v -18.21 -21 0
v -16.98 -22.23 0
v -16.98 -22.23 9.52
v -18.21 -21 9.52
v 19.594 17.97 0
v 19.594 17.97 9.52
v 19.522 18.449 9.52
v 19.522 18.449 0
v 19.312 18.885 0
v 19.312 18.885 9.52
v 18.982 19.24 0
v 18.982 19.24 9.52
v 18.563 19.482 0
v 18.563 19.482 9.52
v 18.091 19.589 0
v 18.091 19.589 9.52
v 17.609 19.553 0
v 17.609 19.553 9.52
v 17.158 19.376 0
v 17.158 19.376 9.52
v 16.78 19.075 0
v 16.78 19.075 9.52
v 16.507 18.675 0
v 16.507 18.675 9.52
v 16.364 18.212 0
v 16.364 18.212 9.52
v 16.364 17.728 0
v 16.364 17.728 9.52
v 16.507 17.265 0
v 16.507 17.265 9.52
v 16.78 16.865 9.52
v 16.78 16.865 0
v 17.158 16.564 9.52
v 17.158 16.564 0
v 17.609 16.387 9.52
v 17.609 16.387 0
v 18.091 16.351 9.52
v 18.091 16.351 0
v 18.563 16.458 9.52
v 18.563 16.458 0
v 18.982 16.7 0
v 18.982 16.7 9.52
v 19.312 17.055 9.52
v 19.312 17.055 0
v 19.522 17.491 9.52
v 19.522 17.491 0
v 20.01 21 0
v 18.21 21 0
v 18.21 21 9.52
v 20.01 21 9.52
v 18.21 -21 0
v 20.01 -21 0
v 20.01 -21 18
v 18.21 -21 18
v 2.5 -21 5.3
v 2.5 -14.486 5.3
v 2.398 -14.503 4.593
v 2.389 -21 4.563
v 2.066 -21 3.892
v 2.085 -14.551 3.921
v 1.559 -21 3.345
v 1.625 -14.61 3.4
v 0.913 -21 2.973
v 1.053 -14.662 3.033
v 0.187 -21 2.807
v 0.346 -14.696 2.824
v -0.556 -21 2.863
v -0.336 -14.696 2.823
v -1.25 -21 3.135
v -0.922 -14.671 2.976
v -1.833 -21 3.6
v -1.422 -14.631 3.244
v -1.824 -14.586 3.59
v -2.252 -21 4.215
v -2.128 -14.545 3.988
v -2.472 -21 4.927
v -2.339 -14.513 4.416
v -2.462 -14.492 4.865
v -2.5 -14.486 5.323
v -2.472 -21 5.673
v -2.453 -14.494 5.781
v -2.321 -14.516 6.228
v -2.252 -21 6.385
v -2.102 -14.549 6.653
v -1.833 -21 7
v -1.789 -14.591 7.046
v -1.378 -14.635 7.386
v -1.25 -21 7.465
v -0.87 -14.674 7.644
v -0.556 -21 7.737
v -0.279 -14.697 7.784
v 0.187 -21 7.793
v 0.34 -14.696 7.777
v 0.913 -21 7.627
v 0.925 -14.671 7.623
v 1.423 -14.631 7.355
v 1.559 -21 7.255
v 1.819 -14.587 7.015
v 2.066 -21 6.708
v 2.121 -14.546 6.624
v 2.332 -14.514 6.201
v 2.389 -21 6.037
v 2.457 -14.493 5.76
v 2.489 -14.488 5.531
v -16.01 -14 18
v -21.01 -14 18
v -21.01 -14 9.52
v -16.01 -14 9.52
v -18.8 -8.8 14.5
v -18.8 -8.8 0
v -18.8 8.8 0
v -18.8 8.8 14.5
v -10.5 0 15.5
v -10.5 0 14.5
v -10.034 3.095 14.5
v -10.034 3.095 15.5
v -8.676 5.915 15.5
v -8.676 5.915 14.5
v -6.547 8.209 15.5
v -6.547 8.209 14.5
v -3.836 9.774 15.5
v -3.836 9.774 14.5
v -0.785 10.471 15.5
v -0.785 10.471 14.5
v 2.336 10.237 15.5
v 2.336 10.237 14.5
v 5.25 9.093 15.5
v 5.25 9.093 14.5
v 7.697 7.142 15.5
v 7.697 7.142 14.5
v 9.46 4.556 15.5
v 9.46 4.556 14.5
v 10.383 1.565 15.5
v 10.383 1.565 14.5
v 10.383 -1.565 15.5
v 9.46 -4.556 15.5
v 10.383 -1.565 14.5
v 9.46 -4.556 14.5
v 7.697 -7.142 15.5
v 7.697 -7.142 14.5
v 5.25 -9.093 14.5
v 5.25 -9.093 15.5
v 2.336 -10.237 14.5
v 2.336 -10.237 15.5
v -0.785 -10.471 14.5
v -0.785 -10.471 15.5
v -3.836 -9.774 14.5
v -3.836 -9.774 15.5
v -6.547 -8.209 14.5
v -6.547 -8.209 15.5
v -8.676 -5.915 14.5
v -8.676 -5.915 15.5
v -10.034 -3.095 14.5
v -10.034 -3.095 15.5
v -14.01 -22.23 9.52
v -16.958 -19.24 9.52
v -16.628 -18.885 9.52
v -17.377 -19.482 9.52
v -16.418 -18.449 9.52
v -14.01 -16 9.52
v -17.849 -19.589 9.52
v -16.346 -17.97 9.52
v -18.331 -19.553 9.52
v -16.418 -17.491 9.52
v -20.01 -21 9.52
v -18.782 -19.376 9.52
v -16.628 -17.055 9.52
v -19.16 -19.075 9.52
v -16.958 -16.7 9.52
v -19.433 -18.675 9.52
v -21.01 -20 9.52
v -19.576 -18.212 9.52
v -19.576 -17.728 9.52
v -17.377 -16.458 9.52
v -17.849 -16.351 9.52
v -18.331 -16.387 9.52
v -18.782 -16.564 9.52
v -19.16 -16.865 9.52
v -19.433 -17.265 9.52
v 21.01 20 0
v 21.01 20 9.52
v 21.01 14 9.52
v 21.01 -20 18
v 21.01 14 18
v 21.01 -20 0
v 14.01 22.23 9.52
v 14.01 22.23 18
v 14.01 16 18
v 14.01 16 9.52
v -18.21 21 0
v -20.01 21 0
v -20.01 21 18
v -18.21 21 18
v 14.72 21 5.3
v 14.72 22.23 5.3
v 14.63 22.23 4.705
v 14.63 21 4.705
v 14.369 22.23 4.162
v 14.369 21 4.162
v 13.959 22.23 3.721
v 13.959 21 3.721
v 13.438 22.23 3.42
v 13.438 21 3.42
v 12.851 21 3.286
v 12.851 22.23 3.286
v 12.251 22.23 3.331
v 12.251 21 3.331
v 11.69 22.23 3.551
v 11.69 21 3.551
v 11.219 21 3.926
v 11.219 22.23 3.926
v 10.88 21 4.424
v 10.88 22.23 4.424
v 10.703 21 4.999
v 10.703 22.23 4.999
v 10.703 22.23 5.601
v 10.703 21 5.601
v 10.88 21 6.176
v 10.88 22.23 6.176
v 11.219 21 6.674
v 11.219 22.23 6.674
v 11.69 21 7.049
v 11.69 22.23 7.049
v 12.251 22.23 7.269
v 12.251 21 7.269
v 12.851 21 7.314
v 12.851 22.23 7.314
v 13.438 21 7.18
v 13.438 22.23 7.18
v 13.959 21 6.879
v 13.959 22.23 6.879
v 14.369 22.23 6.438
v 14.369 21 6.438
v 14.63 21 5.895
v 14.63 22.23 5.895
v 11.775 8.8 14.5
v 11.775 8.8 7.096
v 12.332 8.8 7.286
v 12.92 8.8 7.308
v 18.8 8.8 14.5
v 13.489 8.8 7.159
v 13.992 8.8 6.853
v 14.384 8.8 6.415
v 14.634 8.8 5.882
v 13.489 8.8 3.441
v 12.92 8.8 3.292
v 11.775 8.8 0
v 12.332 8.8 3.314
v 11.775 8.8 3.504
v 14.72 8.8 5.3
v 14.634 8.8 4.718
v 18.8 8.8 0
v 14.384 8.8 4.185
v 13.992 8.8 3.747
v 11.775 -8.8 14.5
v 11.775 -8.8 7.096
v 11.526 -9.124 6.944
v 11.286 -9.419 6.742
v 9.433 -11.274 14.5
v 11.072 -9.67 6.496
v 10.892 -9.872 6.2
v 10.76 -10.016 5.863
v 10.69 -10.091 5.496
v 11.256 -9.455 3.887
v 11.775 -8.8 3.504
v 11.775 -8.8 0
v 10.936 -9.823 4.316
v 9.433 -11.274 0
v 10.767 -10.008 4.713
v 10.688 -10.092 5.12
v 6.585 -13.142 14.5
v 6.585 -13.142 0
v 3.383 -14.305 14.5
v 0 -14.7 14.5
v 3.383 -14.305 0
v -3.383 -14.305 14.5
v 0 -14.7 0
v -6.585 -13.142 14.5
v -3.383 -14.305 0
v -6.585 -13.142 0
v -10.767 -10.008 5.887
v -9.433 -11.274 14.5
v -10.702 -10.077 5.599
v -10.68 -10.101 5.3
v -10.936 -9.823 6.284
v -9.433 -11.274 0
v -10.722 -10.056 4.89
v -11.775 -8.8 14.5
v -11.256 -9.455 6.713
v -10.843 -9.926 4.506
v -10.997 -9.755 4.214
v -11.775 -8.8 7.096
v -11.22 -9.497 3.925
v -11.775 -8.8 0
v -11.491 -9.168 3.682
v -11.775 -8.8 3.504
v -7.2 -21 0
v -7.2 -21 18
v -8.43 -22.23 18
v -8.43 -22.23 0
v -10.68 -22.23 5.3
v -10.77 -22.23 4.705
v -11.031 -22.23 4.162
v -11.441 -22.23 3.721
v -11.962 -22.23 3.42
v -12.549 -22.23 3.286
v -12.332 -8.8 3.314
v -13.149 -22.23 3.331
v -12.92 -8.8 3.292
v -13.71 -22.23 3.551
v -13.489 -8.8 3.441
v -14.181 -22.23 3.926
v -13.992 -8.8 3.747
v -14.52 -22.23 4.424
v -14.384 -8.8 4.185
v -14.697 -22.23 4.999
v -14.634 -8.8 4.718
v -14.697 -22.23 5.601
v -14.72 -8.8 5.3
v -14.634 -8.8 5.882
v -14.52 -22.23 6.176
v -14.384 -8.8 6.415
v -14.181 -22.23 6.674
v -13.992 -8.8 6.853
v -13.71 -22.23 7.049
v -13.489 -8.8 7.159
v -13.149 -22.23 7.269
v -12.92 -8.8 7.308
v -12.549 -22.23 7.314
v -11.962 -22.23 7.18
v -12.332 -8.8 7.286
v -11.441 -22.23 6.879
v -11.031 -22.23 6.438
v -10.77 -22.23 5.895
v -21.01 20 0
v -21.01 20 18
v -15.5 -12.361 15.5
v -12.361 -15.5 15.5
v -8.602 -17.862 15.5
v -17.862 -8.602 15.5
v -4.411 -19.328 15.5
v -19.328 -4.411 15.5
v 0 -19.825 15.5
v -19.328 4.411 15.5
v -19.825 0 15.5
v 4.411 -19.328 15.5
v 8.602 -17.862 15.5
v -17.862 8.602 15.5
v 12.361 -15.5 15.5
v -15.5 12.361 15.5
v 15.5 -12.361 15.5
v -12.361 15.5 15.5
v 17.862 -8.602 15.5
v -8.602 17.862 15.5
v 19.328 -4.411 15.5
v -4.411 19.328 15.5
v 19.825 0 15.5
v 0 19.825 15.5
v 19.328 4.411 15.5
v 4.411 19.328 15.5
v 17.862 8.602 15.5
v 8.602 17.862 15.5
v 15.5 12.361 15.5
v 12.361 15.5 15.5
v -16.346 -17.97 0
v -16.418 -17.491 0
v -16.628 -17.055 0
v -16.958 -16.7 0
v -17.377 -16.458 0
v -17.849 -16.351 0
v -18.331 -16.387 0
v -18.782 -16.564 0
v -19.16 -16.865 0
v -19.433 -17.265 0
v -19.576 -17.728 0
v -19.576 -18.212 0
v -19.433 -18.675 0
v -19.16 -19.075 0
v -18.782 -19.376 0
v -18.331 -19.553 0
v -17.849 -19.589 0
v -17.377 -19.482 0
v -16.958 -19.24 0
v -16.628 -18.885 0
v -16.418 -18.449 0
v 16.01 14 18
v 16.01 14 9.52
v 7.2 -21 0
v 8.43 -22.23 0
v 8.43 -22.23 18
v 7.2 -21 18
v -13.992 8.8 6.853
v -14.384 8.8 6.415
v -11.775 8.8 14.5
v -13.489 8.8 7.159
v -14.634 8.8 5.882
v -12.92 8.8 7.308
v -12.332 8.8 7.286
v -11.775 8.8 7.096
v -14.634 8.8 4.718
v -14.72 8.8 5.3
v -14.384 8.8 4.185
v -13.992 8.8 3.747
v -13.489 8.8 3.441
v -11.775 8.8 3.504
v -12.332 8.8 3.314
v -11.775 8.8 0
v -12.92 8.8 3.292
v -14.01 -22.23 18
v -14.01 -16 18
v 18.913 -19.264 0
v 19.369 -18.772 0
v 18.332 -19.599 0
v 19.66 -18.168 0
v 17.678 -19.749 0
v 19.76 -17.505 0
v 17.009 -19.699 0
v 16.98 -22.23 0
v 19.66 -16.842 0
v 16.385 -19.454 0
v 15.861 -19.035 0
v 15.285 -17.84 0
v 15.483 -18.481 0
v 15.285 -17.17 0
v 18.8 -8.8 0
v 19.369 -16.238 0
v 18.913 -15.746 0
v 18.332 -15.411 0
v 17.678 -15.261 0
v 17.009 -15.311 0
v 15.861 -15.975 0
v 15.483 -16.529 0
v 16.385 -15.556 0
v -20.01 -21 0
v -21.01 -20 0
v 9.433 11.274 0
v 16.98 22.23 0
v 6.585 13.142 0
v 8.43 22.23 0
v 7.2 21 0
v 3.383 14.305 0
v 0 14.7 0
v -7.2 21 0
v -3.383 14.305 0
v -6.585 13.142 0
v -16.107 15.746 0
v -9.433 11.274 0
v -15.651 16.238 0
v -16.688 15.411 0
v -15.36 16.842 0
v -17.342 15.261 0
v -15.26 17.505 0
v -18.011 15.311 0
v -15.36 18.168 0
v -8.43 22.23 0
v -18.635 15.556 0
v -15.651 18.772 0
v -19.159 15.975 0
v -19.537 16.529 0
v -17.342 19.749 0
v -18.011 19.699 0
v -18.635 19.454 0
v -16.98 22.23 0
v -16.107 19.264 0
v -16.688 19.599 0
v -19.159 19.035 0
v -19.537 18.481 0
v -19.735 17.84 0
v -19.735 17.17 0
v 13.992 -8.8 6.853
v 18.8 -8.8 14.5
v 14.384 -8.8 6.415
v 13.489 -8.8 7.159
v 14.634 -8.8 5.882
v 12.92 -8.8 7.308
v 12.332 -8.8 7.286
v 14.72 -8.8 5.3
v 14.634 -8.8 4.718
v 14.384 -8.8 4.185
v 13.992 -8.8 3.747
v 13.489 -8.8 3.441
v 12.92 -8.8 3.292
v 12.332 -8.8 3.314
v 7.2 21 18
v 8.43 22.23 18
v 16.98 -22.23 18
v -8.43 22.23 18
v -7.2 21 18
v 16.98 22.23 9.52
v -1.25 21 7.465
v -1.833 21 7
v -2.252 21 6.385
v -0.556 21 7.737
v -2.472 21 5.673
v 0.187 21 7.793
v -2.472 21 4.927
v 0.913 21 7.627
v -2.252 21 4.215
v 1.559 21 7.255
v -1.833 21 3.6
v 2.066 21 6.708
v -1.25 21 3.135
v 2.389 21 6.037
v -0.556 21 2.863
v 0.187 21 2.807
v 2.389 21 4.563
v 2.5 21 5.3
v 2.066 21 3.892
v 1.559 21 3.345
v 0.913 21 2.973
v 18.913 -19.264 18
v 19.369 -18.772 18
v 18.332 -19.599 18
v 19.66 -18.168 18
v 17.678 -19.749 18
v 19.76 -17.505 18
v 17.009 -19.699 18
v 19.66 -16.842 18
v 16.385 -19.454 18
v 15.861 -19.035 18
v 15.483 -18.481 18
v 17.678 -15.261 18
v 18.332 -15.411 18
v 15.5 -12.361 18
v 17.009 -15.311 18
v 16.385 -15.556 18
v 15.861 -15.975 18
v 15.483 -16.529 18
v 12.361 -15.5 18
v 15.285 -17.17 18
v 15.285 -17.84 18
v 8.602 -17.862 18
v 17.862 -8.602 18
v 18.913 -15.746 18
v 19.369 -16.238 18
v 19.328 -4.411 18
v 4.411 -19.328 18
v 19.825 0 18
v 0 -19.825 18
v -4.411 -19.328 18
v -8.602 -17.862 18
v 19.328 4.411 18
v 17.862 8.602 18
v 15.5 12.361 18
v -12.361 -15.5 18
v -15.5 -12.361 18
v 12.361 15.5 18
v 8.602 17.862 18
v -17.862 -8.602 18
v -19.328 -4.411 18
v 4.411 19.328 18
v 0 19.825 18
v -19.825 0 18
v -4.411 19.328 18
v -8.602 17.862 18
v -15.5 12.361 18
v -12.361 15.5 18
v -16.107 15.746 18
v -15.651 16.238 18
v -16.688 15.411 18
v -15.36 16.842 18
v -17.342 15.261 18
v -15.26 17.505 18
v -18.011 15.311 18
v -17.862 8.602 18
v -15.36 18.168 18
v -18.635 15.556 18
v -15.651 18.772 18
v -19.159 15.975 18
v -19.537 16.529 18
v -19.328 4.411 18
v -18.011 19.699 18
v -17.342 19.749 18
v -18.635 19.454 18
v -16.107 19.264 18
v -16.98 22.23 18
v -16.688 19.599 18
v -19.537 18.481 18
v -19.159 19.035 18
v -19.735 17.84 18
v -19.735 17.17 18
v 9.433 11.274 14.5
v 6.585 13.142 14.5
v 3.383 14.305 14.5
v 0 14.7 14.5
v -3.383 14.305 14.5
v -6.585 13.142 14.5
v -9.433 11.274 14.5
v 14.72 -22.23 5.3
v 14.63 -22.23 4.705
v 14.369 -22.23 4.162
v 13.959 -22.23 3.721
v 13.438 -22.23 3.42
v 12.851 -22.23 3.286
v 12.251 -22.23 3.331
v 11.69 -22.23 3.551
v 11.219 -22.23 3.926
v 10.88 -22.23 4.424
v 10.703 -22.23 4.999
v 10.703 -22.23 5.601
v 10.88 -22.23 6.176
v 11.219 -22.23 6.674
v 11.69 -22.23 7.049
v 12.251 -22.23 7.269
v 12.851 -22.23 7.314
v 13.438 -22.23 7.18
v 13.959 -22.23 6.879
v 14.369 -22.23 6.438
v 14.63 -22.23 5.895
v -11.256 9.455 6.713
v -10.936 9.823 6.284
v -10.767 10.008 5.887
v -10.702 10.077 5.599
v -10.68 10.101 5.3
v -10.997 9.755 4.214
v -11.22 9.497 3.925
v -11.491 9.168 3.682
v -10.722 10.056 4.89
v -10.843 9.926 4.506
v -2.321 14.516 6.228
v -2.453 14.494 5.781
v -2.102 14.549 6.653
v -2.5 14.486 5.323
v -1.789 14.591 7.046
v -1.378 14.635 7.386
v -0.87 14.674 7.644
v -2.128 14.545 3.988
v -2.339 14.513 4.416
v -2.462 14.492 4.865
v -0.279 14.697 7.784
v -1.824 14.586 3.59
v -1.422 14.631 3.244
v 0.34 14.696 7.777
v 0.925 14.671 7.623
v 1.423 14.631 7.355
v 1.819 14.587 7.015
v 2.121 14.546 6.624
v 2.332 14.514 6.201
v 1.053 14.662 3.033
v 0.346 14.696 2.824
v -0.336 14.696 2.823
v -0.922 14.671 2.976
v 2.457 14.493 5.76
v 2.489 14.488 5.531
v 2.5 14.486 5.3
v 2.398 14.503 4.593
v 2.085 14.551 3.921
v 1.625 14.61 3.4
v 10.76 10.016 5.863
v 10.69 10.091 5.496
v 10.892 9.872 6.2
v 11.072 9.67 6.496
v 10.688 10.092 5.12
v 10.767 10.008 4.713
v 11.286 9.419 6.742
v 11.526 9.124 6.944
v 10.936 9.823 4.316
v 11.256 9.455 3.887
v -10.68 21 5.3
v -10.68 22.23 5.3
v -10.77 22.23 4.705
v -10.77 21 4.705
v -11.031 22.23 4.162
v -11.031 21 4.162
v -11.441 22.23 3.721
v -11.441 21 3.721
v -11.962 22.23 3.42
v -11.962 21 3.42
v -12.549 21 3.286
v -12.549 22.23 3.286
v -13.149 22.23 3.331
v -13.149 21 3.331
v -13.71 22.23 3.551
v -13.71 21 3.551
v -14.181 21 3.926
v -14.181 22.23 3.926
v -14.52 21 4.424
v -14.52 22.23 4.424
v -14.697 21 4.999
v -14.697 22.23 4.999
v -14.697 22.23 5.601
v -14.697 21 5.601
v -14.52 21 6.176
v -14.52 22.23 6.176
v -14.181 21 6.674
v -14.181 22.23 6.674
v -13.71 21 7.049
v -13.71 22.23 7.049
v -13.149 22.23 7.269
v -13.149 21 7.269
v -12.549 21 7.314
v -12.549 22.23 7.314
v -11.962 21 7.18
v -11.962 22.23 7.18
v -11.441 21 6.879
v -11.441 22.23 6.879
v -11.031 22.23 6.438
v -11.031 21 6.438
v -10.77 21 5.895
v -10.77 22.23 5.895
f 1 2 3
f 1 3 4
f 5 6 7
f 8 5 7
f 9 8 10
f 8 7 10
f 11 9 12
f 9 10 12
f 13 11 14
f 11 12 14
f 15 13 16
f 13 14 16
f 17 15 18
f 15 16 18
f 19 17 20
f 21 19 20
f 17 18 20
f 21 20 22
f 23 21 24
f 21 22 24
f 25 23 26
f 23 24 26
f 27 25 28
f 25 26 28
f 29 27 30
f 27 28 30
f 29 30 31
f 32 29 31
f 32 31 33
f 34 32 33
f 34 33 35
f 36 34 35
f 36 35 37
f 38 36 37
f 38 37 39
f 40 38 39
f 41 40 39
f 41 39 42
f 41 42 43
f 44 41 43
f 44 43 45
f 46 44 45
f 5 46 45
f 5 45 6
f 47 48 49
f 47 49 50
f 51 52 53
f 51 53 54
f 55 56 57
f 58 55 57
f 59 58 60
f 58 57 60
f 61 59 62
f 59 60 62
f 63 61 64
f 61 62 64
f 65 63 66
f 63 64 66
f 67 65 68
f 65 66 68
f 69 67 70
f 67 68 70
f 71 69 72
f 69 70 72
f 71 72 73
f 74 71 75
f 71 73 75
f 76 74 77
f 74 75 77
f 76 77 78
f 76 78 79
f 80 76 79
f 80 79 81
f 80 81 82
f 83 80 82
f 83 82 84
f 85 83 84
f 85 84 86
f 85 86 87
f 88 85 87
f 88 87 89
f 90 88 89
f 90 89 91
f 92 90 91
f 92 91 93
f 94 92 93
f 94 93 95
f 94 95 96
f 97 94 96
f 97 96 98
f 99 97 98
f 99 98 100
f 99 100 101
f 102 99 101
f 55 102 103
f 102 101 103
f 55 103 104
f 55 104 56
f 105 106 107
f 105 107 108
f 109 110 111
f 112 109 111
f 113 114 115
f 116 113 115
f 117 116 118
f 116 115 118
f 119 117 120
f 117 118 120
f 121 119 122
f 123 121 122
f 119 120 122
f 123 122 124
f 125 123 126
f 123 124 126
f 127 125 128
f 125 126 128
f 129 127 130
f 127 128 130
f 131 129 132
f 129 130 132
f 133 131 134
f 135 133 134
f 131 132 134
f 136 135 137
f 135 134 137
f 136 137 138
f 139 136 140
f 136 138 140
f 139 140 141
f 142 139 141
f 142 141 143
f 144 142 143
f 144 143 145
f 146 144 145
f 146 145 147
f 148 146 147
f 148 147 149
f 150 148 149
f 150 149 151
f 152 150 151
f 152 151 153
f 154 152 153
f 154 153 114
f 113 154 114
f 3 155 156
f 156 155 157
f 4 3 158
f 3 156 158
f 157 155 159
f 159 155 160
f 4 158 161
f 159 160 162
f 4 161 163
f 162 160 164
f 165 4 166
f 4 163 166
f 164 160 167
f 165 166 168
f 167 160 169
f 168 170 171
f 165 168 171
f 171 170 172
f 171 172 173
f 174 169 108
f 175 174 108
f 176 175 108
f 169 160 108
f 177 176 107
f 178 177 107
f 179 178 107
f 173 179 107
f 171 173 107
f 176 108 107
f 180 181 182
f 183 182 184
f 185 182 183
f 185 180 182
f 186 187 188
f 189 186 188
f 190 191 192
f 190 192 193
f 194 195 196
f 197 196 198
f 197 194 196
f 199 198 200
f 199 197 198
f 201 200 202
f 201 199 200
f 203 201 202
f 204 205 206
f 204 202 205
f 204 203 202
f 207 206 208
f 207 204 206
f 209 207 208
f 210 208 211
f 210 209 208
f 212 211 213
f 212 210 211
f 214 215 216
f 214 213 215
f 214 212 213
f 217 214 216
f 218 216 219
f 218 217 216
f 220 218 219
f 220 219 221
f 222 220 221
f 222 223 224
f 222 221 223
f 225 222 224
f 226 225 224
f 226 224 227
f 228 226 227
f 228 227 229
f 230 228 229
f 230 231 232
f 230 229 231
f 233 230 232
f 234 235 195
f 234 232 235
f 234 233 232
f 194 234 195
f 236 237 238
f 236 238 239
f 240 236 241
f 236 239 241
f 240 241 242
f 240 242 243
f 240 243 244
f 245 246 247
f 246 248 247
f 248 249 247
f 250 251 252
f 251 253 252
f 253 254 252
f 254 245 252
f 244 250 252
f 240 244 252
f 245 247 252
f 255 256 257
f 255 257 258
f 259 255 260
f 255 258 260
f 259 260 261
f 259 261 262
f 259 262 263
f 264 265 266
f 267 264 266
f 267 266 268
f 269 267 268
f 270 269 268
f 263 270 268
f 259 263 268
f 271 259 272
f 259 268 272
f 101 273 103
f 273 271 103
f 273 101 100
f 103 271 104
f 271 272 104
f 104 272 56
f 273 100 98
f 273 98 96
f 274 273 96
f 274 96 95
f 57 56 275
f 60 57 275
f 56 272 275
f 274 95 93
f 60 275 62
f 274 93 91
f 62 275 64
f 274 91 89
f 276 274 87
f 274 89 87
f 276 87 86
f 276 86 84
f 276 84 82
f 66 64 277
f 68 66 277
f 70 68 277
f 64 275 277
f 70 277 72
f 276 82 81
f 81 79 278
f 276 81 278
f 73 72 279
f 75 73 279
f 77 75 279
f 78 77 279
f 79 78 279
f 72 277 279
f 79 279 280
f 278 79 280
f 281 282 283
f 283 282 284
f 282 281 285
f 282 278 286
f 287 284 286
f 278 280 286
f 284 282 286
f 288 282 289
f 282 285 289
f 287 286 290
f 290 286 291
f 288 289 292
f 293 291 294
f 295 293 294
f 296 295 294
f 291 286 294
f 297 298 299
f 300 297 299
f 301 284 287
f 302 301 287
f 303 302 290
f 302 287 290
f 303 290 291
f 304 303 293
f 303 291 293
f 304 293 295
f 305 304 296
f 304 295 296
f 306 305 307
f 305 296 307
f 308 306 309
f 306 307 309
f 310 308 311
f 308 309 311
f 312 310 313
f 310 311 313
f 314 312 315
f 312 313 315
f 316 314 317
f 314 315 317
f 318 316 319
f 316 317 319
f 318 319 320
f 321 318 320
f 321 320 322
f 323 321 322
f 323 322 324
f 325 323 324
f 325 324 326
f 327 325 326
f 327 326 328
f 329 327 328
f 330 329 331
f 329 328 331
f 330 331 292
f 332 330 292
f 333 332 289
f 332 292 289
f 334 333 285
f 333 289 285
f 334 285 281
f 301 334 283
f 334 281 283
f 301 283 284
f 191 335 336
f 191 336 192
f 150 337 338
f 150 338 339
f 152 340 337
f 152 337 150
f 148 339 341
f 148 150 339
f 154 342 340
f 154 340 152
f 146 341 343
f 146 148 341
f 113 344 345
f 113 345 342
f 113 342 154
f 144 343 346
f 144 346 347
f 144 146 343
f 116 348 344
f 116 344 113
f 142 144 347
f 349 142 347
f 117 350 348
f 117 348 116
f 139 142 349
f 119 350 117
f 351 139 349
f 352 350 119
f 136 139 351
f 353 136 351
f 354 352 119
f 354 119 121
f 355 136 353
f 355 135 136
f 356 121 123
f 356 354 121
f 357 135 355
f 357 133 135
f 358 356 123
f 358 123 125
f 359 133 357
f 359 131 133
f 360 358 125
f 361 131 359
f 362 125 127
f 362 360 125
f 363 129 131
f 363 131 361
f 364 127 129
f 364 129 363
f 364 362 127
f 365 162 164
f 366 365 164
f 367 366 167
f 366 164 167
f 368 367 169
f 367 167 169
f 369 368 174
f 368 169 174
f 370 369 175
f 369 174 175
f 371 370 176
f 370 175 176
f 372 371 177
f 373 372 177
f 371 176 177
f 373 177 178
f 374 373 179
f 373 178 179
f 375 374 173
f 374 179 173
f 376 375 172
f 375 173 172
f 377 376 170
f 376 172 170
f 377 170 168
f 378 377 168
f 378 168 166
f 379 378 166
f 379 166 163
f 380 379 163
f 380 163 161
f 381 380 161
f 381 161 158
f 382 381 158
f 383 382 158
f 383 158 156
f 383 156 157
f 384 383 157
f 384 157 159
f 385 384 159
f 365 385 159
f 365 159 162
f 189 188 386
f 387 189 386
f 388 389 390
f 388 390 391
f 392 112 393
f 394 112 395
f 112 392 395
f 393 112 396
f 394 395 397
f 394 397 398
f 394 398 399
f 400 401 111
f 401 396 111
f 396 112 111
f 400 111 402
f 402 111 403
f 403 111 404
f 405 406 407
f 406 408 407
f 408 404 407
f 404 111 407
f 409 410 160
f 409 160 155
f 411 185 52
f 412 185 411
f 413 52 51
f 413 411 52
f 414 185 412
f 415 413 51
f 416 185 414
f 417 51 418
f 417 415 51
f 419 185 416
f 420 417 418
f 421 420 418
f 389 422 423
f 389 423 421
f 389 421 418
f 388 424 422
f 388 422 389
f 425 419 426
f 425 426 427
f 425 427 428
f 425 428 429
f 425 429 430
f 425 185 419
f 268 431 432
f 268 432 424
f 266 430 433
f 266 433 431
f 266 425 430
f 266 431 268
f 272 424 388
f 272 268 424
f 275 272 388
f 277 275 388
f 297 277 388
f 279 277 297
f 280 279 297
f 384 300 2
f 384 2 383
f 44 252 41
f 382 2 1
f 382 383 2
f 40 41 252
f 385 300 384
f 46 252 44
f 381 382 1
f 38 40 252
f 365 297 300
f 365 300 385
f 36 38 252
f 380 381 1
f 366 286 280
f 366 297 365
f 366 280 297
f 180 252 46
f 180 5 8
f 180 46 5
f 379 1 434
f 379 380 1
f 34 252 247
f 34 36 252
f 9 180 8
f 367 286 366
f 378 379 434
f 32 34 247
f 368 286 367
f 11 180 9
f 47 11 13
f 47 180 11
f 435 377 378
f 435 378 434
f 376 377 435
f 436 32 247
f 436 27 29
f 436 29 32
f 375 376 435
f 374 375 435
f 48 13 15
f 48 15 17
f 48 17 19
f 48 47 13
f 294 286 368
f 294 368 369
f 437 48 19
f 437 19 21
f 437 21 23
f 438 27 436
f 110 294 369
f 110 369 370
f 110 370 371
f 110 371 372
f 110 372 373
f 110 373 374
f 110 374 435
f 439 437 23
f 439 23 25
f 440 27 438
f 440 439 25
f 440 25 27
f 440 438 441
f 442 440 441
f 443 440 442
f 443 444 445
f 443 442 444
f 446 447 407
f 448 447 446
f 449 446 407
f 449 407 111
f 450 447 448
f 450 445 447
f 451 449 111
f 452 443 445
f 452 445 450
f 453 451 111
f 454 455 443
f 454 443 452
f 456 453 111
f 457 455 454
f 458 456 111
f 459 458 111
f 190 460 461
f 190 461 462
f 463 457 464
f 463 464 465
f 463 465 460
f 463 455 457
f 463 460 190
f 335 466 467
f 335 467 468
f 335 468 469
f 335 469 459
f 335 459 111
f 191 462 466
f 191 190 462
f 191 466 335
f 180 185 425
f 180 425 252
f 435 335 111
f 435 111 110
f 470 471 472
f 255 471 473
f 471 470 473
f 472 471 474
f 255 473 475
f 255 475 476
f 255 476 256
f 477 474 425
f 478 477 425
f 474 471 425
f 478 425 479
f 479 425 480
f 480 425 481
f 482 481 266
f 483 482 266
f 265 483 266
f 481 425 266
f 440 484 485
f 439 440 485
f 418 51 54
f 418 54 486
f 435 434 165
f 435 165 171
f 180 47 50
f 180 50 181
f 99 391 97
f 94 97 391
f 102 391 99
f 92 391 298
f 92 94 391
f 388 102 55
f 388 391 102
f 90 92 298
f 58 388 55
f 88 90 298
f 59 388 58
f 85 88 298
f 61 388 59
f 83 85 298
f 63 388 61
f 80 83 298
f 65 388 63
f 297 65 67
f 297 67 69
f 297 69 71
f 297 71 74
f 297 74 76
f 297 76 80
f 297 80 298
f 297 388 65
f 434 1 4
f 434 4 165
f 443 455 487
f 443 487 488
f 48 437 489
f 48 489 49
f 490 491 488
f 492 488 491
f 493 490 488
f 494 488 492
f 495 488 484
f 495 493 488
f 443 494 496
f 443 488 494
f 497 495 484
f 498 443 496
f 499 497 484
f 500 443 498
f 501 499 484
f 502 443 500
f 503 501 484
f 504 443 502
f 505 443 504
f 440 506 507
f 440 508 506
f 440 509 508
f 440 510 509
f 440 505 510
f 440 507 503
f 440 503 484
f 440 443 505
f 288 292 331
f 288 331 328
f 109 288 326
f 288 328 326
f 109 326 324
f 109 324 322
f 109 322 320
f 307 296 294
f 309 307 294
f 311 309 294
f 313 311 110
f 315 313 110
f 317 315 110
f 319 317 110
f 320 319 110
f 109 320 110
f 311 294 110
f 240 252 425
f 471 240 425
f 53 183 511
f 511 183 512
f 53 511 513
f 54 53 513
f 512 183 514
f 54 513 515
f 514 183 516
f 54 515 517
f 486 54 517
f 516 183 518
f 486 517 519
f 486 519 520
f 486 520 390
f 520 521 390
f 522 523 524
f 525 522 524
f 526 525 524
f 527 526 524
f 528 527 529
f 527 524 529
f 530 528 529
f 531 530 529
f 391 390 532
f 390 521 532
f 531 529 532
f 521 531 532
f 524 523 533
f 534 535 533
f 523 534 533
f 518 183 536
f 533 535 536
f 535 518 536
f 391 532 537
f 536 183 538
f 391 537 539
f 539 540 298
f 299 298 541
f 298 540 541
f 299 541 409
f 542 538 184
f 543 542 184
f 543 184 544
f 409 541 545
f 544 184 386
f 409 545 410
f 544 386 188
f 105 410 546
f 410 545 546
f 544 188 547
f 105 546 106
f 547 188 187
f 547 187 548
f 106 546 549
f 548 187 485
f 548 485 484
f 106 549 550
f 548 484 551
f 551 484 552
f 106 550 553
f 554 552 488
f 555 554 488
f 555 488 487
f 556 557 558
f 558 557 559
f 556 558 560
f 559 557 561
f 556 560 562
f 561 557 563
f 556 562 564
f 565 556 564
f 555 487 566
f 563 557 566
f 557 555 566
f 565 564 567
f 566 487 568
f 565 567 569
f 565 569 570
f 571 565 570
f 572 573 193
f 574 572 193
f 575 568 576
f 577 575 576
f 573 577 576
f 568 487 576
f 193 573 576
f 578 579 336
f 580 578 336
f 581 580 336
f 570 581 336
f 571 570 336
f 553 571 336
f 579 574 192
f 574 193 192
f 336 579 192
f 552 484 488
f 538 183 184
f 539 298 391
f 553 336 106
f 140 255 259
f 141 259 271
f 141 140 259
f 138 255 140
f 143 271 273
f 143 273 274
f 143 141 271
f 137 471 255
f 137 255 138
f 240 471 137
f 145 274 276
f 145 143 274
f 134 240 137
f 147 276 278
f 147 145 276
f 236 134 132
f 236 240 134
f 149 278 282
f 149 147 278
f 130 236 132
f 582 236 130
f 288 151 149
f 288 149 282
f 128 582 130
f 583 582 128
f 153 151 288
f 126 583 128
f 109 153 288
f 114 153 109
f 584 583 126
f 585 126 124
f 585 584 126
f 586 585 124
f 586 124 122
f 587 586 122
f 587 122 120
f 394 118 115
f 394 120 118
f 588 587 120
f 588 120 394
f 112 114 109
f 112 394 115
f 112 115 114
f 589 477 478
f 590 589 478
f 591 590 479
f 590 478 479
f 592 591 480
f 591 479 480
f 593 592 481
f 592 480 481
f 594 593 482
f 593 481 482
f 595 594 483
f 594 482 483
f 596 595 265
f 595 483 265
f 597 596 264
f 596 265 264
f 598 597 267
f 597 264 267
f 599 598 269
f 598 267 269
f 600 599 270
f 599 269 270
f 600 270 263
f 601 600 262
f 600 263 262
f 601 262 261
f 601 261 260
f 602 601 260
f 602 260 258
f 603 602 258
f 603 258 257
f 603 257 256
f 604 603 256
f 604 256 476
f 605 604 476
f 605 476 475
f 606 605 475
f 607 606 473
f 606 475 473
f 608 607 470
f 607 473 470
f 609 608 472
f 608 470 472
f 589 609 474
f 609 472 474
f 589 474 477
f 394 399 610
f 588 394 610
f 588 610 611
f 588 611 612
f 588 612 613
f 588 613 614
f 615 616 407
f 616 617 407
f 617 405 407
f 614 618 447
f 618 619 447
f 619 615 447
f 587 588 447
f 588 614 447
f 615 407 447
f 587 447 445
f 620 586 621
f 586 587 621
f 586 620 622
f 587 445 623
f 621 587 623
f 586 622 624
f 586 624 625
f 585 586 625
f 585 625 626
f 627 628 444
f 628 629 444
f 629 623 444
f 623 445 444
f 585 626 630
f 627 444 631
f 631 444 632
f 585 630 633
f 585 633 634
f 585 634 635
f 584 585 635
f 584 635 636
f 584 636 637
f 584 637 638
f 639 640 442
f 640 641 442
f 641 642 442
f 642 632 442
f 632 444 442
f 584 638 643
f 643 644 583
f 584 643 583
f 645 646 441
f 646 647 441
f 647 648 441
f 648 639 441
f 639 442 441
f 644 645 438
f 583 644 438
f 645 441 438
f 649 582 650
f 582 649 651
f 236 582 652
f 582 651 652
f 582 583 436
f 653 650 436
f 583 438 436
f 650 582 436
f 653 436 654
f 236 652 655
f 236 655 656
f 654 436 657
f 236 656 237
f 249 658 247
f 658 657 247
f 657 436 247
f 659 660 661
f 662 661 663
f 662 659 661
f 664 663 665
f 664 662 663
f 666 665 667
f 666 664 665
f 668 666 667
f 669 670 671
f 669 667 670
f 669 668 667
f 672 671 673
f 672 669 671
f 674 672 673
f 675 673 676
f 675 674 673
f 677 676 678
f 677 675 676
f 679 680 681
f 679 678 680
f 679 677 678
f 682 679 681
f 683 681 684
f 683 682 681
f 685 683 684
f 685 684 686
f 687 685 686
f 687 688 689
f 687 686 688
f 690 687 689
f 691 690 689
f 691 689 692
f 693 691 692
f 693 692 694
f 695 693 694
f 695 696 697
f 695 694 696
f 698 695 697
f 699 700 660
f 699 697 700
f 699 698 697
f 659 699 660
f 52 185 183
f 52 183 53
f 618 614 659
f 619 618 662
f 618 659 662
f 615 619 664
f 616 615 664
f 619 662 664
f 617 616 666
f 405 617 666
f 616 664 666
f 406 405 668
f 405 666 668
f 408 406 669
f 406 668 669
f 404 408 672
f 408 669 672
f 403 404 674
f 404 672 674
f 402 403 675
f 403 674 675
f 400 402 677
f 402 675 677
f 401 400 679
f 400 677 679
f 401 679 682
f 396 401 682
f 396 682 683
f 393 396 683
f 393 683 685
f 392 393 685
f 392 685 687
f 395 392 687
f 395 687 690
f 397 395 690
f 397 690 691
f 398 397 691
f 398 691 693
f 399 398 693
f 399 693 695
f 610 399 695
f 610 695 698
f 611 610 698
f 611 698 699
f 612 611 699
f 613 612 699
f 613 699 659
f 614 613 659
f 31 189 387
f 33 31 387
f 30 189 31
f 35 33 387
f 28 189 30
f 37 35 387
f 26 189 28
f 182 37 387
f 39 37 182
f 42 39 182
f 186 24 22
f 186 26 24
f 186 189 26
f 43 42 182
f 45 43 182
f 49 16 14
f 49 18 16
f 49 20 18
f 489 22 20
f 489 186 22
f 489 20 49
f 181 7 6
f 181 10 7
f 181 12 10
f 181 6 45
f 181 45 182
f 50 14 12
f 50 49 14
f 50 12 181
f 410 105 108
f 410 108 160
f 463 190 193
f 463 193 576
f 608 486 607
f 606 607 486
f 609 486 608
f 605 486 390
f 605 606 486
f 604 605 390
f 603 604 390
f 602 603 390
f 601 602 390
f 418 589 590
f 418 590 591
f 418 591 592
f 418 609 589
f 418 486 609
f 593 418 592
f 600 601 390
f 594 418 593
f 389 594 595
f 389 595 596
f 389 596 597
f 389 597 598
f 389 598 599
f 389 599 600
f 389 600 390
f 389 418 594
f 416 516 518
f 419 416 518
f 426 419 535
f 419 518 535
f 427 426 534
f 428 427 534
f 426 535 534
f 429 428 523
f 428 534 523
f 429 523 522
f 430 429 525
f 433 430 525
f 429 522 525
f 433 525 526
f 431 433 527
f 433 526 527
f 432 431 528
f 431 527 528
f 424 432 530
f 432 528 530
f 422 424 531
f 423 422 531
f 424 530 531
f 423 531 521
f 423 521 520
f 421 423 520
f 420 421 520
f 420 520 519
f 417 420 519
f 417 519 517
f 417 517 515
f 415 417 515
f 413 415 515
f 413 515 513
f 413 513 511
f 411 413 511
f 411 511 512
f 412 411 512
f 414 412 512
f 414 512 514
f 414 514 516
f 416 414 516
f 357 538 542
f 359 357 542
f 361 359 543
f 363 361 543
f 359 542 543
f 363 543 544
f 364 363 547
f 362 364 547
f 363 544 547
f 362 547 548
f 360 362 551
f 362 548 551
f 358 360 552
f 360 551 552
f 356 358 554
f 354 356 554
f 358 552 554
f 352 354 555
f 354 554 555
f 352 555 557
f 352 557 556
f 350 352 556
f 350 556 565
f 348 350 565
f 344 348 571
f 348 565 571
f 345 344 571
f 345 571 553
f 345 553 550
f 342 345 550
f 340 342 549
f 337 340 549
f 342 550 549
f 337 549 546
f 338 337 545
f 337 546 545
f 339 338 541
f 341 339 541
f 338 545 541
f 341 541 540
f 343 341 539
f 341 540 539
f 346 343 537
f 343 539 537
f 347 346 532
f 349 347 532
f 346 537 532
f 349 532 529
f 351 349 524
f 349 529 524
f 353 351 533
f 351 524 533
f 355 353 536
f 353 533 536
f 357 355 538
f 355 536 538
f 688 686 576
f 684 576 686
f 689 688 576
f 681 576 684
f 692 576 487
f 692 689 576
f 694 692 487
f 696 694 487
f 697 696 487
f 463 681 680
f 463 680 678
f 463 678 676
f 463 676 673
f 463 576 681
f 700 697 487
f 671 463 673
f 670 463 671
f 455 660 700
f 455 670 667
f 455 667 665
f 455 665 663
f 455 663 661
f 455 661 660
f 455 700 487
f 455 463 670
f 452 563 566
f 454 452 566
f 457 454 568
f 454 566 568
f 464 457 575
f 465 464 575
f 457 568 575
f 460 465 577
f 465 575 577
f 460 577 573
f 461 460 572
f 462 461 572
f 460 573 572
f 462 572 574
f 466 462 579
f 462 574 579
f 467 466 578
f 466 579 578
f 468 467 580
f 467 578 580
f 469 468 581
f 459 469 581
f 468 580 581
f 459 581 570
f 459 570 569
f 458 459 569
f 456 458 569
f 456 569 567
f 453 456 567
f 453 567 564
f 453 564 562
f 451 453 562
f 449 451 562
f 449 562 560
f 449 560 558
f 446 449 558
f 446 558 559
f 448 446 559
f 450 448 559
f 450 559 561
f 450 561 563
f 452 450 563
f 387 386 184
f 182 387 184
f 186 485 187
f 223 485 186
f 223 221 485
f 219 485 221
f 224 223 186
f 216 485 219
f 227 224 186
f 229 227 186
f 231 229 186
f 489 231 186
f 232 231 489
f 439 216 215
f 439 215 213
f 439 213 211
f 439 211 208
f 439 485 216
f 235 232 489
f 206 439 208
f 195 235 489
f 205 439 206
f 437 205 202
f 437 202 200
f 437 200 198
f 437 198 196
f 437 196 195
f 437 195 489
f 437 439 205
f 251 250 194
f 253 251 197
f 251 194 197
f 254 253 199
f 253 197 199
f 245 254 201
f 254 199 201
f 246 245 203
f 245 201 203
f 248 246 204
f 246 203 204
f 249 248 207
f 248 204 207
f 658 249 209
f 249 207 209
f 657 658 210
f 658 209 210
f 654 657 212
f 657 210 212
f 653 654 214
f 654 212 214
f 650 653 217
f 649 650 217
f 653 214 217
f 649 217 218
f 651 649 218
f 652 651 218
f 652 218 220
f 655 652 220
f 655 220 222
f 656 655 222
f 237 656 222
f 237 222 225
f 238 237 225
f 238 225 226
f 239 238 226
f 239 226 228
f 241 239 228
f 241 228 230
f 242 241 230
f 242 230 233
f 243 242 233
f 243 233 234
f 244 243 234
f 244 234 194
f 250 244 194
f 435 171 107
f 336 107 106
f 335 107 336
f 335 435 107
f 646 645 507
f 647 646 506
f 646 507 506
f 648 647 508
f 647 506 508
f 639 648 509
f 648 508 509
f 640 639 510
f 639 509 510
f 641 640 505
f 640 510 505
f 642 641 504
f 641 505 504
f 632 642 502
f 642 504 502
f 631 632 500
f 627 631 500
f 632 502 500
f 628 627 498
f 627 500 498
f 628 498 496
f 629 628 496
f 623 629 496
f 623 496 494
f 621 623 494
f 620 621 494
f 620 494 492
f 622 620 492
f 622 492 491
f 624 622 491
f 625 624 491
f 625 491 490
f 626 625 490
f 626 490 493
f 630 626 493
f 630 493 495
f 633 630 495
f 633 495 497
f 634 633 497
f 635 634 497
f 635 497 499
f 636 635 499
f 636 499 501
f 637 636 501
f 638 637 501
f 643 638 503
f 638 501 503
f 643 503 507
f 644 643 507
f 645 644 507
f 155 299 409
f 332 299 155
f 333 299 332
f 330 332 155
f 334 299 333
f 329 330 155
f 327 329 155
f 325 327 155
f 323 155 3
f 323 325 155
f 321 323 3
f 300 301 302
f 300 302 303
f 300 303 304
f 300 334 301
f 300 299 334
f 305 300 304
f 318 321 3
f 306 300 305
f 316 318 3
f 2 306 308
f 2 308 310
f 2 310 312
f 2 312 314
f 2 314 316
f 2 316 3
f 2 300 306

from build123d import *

# Parameters (mm, degrees)
BOSS_EXTRUDE2_DEPTH     = 18
SKETCH2_R               = 19.825
CUT_EXTRUDE1_DEPTH      = 2.5
SKETCH3_R               = 14.7
CUT_EXTRUDE2_DEPTH      = 14.5
CUT_EXTRUDE3_DEPTH      = 14.5
SKETCH5_R               = 10.5
CUT_EXTRUDE4_DEPTH      = 14.5
SKETCH7_R               = 2.5
SKETCH7_R_2             = 2.02
CUT_EXTRUDE6_DEPTH      = 30
CUT_EXTRUDE6_DEPTH_BACK = 60
SKETCH9_R               = 1.623885446
SKETCH9_R_2             = 2.25
CUT_EXTRUDE7_DEPTH      = 30
CUT_EXTRUDE8_DEPTH      = 8.48


with BuildPart() as part:
    # Sketch1 → Boss-Extrude2 (new body)
    with BuildSketch(Plane.XY):
        Polygon((-7.2, 21), (7.2, 21), (8.43, 22.23), (16.98, 22.23), (18.21, 21), (20.01, 21), (21.01, 20), (21.01, -20), (20.01, -21), (18.21, -21), (16.98, -22.23), (8.43, -22.23), (7.2, -21), (-7.2, -21), (-8.43, -22.23), (-16.98, -22.23), (-18.21, -21), (-20.01, -21), (-21.01, -20), (-21.01, 20), (-20.01, 21), (-18.21, 21), (-16.98, 22.23), (-8.43, 22.23), align=None)
    extrude(amount=BOSS_EXTRUDE2_DEPTH)

    # Sketch2 → Cut-Extrude1 (cut)
    with BuildSketch(Plane.XY.offset(18)):
        Circle(SKETCH2_R)
    extrude(amount=-CUT_EXTRUDE1_DEPTH, mode=Mode.SUBTRACT)

    # Sketch3 → Cut-Extrude2 (cut)
    with BuildSketch(Plane(origin=(0, 0, 0), x_dir=(-1, 0, 0), z_dir=(0, 0, -1))):
        Circle(SKETCH3_R)
    extrude(amount=-CUT_EXTRUDE2_DEPTH, mode=Mode.SUBTRACT)

    # Sketch4 → Cut-Extrude3 (cut)
    with BuildSketch(Plane(origin=(0, 0, 0), x_dir=(-1, 0, 0), z_dir=(0, 0, -1))):
        Polygon((18.8, 0), (18.8, 8.8), (-18.8, 8.8), (-18.8, -8.8), (18.8, -8.8), align=None)
    extrude(amount=-CUT_EXTRUDE3_DEPTH, mode=Mode.SUBTRACT)

    # Sketch5 → Cut-Extrude4 (cut)
    with BuildSketch(Plane(origin=(0, 0, 14.5), x_dir=(-1, 0, 0), z_dir=(0, 0, -1))):
        Circle(SKETCH5_R)
    extrude(amount=-CUT_EXTRUDE4_DEPTH, mode=Mode.SUBTRACT)

    # Sketch7 → Cut-Extrude6 (cut, two sides)
    with BuildSketch(Plane(origin=(0, 21, 0), x_dir=(1, 0, 0), z_dir=(0, 1, 0))) as cut_extrude6_sk:
        with Locations((0, -5.3)):
            Circle(SKETCH7_R)
        with Locations((12.7, -5.3)):
            Circle(SKETCH7_R_2)
        with Locations((-12.7, -5.3)):
            Circle(SKETCH7_R_2)
    extrude(amount=CUT_EXTRUDE6_DEPTH, mode=Mode.SUBTRACT)
    extrude(cut_extrude6_sk.sketch, amount=-CUT_EXTRUDE6_DEPTH_BACK, mode=Mode.SUBTRACT)

    # Sketch9 → Cut-Extrude7 (cut)
    with BuildSketch(Plane.XY.offset(18)):
        with Locations((17.97, 17.97)):
            Circle(SKETCH9_R)
        with Locations((-17.51, 17.505)):
            Circle(SKETCH9_R_2)
        with Locations((17.51, -17.505)):
            Circle(SKETCH9_R_2)
        with Locations((-17.97, -17.97)):
            Circle(SKETCH9_R)
    extrude(amount=-CUT_EXTRUDE7_DEPTH, mode=Mode.SUBTRACT)

    # Sketch10 → Cut-Extrude8 (cut)
    with BuildSketch(Plane.XY.offset(18)):
        Polygon((14.01, 22.23), (14.01, 16), (16.01, 14), (21.01, 14), (21.01, 20), (20.01, 21), (18.21, 21), (16.98, 22.23), align=None)
        Polygon((-21.01, -14), (-16.01, -14), (-14.01, -16), (-14.01, -22.23), (-16.98, -22.23), (-18.21, -21), (-20.01, -21), (-21.01, -20), align=None)
    extrude(amount=-CUT_EXTRUDE8_DEPTH, mode=Mode.SUBTRACT)


solid = part.part
